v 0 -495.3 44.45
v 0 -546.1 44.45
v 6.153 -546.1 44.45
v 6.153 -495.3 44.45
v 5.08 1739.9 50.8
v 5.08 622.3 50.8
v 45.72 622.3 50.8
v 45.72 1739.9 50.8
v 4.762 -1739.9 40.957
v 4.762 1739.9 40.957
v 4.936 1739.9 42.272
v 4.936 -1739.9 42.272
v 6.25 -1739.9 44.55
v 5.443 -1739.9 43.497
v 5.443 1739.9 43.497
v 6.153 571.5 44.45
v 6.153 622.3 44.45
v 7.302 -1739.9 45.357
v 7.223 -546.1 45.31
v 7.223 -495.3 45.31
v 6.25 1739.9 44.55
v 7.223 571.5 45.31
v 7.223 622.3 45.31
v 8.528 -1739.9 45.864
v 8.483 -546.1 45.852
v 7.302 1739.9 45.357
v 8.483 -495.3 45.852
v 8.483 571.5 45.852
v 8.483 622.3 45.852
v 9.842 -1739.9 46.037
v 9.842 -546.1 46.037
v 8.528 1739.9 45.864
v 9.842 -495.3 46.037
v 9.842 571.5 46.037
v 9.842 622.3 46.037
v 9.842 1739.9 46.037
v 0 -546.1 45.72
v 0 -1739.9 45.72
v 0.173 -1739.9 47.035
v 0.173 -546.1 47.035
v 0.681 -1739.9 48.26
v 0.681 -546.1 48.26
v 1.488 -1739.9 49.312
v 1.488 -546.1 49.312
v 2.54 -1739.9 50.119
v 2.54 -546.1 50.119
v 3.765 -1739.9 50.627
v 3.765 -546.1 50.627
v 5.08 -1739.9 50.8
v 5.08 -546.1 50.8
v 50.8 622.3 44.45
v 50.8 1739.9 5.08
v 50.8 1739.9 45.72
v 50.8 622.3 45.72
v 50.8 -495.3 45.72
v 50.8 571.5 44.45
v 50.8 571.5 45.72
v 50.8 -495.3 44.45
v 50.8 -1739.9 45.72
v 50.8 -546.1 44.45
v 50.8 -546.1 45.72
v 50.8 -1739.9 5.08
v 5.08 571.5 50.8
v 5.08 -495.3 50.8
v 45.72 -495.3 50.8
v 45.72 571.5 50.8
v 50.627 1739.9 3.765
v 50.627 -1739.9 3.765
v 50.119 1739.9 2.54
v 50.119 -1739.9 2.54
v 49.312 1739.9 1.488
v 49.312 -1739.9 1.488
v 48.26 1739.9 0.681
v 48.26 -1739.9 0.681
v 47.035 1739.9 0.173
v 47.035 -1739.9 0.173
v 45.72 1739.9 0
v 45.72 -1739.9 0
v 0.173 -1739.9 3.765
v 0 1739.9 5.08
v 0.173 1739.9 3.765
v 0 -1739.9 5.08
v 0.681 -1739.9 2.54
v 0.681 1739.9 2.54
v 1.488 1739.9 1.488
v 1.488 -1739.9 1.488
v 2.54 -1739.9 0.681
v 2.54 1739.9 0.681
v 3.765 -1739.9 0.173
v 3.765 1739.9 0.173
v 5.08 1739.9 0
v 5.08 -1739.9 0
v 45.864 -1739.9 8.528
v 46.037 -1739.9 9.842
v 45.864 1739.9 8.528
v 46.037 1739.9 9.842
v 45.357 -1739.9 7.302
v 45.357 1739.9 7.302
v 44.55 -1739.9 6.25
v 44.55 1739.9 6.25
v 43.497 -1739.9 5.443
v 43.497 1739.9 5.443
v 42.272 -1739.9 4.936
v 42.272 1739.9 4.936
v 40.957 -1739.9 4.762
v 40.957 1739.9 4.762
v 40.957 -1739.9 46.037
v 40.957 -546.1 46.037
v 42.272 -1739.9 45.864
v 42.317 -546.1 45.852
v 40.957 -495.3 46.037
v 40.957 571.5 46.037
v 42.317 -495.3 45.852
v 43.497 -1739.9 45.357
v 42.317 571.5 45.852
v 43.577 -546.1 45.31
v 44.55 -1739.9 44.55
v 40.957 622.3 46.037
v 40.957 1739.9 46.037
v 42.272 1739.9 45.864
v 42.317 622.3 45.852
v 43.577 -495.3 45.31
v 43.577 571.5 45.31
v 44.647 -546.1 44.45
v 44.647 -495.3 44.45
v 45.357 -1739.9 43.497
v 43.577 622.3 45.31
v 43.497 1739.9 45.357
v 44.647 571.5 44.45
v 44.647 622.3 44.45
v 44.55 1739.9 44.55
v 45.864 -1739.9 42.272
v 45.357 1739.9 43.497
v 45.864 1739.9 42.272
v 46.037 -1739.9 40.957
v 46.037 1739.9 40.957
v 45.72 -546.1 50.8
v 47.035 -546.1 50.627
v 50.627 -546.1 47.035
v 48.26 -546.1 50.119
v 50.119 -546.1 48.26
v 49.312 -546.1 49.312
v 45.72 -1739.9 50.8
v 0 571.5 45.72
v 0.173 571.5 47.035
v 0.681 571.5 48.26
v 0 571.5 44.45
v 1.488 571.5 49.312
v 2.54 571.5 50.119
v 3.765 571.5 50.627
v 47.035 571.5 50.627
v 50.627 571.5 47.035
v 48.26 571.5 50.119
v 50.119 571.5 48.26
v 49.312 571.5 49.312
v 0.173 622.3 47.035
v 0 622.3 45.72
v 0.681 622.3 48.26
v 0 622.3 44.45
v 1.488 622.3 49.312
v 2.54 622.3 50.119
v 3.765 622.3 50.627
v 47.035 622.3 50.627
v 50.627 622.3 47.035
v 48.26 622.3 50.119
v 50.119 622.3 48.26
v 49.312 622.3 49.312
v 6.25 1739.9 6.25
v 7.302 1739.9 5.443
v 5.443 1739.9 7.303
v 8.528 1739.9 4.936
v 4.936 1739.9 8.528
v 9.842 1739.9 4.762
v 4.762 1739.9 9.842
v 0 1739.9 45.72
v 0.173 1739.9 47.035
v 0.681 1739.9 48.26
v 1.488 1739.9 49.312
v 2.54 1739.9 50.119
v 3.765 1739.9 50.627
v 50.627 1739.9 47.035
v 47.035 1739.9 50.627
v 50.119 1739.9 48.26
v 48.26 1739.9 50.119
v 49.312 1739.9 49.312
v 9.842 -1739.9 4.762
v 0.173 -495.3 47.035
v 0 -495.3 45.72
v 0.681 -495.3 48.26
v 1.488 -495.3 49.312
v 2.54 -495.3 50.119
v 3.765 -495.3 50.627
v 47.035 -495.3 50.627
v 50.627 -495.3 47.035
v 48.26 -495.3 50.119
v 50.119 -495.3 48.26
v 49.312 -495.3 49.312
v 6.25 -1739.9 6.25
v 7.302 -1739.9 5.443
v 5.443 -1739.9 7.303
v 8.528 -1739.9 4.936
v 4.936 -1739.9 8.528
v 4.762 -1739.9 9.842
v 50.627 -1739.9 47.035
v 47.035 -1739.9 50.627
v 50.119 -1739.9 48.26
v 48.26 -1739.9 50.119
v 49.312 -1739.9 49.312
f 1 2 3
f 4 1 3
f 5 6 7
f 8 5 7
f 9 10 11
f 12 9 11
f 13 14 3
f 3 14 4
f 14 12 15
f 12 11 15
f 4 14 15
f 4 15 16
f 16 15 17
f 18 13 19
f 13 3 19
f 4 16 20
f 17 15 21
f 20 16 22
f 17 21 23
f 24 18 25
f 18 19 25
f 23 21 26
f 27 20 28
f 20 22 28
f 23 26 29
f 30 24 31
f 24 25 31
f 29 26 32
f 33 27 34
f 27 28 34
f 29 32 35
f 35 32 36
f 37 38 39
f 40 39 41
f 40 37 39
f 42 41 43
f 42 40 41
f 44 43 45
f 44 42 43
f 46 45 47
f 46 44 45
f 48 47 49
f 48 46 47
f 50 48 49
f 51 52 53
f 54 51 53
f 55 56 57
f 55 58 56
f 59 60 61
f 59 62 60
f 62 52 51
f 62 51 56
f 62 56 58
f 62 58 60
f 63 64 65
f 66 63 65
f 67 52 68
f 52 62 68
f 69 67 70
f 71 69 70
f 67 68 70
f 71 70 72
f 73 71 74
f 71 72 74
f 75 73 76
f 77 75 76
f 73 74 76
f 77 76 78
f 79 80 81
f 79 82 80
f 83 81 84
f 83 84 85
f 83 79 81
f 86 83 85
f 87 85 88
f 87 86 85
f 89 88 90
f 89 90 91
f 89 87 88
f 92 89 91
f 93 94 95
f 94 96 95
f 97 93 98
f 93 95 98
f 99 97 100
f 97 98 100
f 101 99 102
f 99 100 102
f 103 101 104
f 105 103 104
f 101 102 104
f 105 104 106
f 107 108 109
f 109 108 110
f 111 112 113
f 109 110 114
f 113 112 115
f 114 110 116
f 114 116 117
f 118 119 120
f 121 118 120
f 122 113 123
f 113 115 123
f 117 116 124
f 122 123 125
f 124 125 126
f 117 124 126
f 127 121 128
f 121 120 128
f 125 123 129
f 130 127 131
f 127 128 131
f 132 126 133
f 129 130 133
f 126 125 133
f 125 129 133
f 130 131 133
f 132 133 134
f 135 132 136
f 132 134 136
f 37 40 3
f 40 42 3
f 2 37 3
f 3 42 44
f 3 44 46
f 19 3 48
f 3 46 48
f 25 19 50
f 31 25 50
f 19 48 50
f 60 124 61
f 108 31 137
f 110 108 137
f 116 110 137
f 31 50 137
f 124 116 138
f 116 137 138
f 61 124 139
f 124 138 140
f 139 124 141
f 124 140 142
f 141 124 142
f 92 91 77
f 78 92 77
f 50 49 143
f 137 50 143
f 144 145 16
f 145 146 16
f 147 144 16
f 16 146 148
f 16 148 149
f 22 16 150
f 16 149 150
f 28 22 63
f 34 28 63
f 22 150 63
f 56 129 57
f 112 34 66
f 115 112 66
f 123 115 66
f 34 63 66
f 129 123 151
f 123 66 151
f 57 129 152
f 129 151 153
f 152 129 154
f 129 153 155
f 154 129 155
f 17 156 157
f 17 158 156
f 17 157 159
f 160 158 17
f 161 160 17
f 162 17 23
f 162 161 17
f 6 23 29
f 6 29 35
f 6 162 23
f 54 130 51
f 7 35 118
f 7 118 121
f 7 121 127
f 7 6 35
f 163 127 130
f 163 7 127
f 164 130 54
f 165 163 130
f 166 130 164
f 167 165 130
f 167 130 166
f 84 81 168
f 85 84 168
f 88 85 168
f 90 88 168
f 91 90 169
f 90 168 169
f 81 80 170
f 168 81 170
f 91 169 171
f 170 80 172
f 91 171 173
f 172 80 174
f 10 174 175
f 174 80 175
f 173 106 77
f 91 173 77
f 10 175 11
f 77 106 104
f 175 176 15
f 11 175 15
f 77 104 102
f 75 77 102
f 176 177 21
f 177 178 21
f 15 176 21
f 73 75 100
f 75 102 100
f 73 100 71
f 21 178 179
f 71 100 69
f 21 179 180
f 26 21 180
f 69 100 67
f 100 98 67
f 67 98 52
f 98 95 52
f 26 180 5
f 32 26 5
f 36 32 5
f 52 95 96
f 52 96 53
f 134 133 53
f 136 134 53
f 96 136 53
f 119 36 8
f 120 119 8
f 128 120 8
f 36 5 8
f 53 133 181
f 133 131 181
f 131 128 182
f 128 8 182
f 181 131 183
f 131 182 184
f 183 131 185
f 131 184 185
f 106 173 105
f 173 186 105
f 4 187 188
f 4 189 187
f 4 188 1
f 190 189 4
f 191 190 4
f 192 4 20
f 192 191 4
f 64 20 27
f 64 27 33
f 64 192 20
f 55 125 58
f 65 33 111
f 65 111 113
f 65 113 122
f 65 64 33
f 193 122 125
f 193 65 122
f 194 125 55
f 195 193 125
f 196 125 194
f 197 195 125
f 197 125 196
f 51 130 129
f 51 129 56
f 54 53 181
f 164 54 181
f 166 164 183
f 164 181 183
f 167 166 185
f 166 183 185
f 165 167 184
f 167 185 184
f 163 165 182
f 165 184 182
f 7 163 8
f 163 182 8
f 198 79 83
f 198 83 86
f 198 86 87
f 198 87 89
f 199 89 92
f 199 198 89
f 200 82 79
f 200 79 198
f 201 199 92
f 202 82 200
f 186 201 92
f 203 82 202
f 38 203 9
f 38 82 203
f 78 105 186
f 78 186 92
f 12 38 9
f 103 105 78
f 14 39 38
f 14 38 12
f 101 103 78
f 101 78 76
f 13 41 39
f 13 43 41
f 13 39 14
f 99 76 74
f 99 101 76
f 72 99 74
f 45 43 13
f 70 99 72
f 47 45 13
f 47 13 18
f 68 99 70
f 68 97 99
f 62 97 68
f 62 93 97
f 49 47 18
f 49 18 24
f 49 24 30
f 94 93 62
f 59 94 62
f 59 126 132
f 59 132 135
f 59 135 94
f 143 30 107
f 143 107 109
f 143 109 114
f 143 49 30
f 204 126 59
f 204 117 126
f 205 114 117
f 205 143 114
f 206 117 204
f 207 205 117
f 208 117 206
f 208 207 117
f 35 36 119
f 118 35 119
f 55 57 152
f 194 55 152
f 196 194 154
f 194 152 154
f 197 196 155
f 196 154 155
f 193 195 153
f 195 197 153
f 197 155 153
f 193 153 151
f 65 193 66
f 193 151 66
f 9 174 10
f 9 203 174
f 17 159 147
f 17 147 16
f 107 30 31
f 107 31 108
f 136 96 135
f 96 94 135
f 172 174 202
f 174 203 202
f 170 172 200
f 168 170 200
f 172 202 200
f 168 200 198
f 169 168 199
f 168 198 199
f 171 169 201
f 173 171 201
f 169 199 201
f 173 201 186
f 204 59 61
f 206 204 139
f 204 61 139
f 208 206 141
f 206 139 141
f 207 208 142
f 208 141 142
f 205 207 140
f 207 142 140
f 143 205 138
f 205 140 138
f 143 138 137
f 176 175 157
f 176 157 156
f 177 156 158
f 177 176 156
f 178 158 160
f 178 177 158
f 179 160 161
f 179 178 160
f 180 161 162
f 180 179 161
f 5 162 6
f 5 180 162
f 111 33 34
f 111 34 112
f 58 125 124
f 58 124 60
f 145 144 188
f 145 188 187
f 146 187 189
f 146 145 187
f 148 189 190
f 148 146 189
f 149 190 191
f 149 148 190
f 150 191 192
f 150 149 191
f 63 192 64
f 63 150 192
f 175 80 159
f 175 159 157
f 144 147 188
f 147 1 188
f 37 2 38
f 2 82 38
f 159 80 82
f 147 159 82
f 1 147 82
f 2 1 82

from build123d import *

# Parameters (mm, degrees)
F0_W     = 50.8
F0_H     = 50.8
F0_W_2   = 41.275
F0_H_2   = 41.275
F1_DEPTH = 1739.9
F2_R     = 5.08
F3_W     = 50.8
F3_H     = 50.8
F4_DEPTH = 6.35


with BuildPart() as f1:
    # F0 (on Front) → F1 (new body, symmetric)
    with BuildSketch(Plane.XZ):
        with Locations((25.4, 25.4)):
            Rectangle(F0_W, F0_H)
        with Locations((25.4, 25.4)):
            Rectangle(F0_W_2, F0_H_2, mode=Mode.SUBTRACT)
    extrude(amount=F1_DEPTH, both=True)

    # F2
    f2_edges = [f1.edges().sort_by_distance(p)[0] for p in [
        (50.8, 0, 50.8),
        (0, 0, 50.8),
        (4.7625, 0, 46.0375),
        (46.0375, 0, 4.7625),
        (4.7625, 0, 4.7625),
        (46.0375, 0, 46.0375),
        (0, 0, 0),
        (50.8, 0, 0),
    ]]
    fillet(f2_edges, radius=F2_R)

    # F3 (on face) → F4 (cut)
    with BuildSketch(Plane.XY.offset(50.8)):
        with Locations((25.4, -520.7)):
            Rectangle(F3_W, F3_H)
        with Locations((25.4, 596.9)):
            Rectangle(F3_W, F3_H)
    extrude(amount=-F4_DEPTH, mode=Mode.SUBTRACT)


solid = f1.part
